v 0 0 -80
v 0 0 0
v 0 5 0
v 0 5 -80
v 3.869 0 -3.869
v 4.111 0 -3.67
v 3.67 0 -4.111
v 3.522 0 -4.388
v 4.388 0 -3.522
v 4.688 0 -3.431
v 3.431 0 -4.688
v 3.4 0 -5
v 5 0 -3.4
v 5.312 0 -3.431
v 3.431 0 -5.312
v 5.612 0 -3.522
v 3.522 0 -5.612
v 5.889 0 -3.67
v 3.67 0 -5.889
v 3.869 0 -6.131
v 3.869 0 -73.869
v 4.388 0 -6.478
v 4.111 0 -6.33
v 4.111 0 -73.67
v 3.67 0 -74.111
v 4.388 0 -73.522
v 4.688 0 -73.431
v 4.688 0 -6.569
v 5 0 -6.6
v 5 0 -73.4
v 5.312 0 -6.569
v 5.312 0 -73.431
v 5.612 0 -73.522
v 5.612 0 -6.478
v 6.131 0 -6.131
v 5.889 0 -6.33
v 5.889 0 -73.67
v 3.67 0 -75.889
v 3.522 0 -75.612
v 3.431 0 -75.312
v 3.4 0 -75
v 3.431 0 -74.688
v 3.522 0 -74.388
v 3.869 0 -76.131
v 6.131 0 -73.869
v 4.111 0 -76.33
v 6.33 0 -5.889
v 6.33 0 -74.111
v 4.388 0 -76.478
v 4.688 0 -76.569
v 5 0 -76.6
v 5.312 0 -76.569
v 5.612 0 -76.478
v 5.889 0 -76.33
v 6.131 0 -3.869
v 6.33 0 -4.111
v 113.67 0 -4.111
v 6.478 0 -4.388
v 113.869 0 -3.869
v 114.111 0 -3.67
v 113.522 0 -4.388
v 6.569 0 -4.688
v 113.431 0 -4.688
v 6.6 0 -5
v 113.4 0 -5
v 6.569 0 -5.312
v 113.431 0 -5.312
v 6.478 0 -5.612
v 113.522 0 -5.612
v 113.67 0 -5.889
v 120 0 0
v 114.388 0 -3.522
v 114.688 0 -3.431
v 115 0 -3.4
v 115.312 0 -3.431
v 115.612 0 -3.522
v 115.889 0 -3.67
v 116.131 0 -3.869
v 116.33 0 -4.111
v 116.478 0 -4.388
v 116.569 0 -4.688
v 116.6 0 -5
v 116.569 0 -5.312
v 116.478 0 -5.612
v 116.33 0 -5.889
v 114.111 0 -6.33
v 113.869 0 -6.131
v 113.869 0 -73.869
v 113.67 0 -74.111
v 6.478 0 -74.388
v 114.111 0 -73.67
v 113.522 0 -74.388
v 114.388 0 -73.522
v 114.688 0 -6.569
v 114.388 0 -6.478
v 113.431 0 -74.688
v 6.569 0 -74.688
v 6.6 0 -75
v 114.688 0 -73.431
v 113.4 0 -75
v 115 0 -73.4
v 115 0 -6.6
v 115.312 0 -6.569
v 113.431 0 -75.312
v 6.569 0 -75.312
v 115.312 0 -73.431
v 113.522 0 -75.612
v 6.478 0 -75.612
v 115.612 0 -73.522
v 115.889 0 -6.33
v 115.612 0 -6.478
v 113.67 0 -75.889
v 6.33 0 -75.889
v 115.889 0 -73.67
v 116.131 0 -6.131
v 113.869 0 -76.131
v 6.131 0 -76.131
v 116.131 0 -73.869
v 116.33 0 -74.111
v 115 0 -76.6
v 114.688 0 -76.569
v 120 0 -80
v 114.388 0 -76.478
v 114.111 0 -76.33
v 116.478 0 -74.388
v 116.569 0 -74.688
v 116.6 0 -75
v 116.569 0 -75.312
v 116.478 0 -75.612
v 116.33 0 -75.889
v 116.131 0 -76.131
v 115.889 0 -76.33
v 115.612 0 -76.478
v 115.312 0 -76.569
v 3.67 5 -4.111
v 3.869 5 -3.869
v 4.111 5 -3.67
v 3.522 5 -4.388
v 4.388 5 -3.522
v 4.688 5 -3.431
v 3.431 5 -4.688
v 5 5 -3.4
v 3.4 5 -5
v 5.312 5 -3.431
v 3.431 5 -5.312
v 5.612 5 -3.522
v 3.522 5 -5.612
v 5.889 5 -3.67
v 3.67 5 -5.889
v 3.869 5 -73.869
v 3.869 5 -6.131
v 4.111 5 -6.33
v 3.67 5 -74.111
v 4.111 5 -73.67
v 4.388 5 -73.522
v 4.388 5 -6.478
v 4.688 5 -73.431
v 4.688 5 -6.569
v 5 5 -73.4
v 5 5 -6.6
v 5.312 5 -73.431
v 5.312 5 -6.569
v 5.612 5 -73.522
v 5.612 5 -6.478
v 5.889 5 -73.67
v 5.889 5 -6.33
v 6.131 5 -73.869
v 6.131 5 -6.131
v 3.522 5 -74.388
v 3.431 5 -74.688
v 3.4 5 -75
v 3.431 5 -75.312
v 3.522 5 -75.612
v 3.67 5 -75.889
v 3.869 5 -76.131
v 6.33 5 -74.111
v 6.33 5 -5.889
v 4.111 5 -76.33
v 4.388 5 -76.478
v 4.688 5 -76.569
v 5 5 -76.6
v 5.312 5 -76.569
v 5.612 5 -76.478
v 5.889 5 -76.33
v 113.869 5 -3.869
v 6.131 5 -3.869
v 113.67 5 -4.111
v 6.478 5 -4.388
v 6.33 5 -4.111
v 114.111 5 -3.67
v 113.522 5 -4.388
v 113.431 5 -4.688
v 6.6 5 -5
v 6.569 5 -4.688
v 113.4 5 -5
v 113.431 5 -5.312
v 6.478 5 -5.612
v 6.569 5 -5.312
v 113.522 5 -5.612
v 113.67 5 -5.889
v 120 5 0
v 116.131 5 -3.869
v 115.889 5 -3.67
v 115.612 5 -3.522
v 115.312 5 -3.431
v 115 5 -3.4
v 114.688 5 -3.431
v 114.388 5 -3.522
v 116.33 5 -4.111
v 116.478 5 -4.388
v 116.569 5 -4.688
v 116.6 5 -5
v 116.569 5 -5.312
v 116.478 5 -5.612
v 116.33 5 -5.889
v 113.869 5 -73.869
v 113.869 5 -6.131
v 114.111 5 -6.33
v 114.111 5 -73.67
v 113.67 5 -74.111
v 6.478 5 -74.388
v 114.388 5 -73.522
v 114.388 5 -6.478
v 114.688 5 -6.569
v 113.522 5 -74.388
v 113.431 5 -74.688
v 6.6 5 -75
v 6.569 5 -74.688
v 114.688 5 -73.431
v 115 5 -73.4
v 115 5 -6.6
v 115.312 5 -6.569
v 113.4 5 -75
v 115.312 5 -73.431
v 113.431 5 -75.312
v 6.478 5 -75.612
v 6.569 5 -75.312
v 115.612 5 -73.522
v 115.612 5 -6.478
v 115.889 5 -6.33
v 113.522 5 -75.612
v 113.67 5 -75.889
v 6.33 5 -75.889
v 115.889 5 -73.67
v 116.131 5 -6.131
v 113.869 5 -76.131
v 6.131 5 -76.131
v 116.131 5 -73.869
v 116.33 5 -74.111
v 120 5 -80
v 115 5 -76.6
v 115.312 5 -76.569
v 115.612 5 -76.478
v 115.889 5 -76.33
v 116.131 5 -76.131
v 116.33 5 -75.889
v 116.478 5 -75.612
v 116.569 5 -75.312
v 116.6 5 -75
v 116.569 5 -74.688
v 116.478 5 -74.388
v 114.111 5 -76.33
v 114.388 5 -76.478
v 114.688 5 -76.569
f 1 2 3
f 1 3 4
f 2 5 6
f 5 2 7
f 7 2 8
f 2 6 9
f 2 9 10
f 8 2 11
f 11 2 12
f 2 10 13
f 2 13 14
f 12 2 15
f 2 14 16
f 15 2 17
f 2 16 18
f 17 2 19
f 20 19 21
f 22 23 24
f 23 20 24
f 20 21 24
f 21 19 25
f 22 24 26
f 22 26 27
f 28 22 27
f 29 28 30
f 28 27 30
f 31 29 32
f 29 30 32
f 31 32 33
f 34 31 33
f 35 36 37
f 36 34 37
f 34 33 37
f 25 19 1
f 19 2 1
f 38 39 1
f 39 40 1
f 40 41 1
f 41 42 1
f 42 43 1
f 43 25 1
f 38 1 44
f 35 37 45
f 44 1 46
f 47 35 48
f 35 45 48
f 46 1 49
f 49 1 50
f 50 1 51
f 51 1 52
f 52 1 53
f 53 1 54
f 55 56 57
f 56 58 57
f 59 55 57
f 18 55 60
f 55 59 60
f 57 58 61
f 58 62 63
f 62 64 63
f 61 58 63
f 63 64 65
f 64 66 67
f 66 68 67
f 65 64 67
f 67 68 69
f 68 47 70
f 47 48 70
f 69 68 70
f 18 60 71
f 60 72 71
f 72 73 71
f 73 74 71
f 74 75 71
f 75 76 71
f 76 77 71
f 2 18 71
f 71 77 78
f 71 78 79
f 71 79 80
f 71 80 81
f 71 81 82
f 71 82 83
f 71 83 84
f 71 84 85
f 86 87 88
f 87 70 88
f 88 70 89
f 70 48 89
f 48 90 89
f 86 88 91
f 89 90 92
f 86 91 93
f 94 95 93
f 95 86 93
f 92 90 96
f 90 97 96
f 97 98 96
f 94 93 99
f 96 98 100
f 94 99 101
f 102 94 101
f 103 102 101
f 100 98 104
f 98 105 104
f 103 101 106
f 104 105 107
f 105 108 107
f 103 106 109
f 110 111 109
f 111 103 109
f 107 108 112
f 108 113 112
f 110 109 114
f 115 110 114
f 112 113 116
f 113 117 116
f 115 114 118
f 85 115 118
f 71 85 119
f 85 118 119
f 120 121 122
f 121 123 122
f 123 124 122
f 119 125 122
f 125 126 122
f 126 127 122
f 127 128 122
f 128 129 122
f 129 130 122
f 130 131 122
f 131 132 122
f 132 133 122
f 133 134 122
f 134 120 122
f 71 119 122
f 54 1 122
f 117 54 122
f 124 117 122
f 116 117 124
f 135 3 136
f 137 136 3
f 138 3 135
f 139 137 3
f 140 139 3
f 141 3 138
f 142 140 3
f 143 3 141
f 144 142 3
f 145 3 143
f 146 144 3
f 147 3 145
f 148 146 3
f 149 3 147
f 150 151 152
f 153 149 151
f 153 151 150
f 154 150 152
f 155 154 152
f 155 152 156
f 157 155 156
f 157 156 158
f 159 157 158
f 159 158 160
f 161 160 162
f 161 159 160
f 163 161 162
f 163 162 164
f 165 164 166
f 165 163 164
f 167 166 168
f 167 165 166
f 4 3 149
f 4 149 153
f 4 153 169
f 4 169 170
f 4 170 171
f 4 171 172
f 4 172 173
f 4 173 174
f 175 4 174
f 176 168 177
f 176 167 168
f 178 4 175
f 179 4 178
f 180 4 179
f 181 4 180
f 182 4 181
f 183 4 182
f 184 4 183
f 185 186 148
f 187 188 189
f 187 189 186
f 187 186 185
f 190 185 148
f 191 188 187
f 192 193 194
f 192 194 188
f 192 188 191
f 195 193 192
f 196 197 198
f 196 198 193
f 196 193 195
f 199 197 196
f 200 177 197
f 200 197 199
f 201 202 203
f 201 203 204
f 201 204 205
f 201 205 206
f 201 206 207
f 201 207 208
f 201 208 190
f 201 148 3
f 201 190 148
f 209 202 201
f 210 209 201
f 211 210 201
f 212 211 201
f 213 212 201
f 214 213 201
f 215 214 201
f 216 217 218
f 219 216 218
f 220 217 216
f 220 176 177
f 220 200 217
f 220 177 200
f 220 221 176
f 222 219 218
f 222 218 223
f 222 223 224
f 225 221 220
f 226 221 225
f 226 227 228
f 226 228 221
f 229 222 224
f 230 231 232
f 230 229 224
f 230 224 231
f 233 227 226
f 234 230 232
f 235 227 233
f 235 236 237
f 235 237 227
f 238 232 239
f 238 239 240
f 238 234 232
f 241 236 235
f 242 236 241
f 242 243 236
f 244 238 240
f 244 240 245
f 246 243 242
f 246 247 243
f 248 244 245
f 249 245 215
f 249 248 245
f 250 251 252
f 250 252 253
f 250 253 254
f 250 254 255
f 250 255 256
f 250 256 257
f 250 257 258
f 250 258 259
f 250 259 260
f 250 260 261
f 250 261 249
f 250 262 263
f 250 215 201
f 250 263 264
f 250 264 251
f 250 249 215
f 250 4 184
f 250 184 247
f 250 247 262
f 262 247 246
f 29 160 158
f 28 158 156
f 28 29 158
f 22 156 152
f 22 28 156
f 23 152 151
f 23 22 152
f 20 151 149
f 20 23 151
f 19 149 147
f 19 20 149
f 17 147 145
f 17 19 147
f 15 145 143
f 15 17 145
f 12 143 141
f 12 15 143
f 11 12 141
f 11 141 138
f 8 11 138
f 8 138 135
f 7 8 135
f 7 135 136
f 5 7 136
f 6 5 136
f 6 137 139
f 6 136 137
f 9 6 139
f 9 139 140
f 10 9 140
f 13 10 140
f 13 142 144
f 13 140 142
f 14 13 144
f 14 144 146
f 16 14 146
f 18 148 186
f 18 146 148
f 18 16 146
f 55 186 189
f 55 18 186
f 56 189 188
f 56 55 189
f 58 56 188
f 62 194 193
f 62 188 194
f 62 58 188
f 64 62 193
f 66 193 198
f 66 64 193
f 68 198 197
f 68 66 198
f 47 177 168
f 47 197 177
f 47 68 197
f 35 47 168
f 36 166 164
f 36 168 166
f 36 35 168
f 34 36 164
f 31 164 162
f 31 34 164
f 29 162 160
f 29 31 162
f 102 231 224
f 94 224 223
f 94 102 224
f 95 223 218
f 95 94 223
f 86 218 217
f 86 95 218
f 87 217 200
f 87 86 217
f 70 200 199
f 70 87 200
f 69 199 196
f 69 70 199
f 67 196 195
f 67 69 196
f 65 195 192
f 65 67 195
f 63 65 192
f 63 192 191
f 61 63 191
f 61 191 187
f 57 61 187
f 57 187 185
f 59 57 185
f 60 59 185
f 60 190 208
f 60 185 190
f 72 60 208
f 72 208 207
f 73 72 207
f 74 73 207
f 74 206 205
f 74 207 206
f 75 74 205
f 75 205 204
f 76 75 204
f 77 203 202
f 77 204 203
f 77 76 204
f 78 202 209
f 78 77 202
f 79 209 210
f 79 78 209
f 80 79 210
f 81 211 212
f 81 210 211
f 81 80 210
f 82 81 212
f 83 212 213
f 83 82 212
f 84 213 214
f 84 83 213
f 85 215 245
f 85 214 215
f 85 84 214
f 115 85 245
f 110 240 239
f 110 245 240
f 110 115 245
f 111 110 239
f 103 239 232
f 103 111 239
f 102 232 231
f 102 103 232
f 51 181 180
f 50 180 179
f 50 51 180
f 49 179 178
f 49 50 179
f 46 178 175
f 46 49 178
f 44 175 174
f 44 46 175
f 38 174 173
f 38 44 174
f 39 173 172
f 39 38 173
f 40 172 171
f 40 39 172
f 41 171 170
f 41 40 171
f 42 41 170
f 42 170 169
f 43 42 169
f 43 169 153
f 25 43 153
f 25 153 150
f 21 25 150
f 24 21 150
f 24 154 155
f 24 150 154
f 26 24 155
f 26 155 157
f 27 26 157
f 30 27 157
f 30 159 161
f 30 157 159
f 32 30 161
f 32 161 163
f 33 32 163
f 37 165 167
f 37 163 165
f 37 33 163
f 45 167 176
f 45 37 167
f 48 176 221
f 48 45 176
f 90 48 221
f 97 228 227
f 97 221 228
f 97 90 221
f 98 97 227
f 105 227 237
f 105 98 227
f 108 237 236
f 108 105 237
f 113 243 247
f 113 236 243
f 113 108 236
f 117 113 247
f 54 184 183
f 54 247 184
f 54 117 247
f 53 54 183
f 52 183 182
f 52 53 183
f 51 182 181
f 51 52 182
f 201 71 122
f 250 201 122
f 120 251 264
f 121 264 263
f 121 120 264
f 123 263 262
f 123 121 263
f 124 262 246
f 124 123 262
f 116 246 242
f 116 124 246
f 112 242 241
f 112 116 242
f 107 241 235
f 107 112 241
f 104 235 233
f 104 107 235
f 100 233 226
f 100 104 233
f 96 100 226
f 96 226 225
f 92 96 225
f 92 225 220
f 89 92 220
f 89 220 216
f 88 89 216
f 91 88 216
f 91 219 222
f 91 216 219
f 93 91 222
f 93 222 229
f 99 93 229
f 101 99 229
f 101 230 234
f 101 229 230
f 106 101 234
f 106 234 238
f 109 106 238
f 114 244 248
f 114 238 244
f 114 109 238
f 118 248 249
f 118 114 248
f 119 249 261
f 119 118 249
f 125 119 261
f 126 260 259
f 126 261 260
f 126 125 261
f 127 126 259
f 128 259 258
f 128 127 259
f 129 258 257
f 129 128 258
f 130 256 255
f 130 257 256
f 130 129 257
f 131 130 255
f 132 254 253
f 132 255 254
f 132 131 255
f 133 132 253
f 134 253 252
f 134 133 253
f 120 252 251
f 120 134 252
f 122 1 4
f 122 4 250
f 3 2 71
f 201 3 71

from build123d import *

# Parameters (mm, degrees)
ESQUISSE1_W             = 120
ESQUISSE1_H             = 80
BOSS_EXTRU_1_DEPTH      = 5
ESQUISSE2_R             = 1.6
ENL_V_MAT_EXTRU_3_DEPTH = 10


with BuildPart() as part:
    # Esquisse1 → Boss.-Extru.1 (new body)
    with BuildSketch(Plane(origin=(0, 0, 0), x_dir=(1, 0, 0), z_dir=(0, 1, 0))):
        with Locations((60, 40)):
            Rectangle(ESQUISSE1_W, ESQUISSE1_H)
    extrude(amount=BOSS_EXTRU_1_DEPTH)

    # Esquisse2 → Enlèv. mat.-Extru.3 (cut)
    with BuildSketch(Plane(origin=(0, 0, 0), x_dir=(1, 0, 0), z_dir=(0, 1, 0))):
        with Locations(Location((5, 75, 0), (0, 0, 90))):
            Circle(ESQUISSE2_R)
        with Locations(Location((115, 75, 0), (0, 0, 90))):
            Circle(ESQUISSE2_R)
        with Locations(Location((115, 5, 0), (0, 0, 90))):
            Circle(ESQUISSE2_R)
        with Locations(Location((5, 5, 0), (0, 0, 90))):
            Circle(ESQUISSE2_R)
    extrude(amount=ENL_V_MAT_EXTRU_3_DEPTH, mode=Mode.SUBTRACT)


solid = part.part
